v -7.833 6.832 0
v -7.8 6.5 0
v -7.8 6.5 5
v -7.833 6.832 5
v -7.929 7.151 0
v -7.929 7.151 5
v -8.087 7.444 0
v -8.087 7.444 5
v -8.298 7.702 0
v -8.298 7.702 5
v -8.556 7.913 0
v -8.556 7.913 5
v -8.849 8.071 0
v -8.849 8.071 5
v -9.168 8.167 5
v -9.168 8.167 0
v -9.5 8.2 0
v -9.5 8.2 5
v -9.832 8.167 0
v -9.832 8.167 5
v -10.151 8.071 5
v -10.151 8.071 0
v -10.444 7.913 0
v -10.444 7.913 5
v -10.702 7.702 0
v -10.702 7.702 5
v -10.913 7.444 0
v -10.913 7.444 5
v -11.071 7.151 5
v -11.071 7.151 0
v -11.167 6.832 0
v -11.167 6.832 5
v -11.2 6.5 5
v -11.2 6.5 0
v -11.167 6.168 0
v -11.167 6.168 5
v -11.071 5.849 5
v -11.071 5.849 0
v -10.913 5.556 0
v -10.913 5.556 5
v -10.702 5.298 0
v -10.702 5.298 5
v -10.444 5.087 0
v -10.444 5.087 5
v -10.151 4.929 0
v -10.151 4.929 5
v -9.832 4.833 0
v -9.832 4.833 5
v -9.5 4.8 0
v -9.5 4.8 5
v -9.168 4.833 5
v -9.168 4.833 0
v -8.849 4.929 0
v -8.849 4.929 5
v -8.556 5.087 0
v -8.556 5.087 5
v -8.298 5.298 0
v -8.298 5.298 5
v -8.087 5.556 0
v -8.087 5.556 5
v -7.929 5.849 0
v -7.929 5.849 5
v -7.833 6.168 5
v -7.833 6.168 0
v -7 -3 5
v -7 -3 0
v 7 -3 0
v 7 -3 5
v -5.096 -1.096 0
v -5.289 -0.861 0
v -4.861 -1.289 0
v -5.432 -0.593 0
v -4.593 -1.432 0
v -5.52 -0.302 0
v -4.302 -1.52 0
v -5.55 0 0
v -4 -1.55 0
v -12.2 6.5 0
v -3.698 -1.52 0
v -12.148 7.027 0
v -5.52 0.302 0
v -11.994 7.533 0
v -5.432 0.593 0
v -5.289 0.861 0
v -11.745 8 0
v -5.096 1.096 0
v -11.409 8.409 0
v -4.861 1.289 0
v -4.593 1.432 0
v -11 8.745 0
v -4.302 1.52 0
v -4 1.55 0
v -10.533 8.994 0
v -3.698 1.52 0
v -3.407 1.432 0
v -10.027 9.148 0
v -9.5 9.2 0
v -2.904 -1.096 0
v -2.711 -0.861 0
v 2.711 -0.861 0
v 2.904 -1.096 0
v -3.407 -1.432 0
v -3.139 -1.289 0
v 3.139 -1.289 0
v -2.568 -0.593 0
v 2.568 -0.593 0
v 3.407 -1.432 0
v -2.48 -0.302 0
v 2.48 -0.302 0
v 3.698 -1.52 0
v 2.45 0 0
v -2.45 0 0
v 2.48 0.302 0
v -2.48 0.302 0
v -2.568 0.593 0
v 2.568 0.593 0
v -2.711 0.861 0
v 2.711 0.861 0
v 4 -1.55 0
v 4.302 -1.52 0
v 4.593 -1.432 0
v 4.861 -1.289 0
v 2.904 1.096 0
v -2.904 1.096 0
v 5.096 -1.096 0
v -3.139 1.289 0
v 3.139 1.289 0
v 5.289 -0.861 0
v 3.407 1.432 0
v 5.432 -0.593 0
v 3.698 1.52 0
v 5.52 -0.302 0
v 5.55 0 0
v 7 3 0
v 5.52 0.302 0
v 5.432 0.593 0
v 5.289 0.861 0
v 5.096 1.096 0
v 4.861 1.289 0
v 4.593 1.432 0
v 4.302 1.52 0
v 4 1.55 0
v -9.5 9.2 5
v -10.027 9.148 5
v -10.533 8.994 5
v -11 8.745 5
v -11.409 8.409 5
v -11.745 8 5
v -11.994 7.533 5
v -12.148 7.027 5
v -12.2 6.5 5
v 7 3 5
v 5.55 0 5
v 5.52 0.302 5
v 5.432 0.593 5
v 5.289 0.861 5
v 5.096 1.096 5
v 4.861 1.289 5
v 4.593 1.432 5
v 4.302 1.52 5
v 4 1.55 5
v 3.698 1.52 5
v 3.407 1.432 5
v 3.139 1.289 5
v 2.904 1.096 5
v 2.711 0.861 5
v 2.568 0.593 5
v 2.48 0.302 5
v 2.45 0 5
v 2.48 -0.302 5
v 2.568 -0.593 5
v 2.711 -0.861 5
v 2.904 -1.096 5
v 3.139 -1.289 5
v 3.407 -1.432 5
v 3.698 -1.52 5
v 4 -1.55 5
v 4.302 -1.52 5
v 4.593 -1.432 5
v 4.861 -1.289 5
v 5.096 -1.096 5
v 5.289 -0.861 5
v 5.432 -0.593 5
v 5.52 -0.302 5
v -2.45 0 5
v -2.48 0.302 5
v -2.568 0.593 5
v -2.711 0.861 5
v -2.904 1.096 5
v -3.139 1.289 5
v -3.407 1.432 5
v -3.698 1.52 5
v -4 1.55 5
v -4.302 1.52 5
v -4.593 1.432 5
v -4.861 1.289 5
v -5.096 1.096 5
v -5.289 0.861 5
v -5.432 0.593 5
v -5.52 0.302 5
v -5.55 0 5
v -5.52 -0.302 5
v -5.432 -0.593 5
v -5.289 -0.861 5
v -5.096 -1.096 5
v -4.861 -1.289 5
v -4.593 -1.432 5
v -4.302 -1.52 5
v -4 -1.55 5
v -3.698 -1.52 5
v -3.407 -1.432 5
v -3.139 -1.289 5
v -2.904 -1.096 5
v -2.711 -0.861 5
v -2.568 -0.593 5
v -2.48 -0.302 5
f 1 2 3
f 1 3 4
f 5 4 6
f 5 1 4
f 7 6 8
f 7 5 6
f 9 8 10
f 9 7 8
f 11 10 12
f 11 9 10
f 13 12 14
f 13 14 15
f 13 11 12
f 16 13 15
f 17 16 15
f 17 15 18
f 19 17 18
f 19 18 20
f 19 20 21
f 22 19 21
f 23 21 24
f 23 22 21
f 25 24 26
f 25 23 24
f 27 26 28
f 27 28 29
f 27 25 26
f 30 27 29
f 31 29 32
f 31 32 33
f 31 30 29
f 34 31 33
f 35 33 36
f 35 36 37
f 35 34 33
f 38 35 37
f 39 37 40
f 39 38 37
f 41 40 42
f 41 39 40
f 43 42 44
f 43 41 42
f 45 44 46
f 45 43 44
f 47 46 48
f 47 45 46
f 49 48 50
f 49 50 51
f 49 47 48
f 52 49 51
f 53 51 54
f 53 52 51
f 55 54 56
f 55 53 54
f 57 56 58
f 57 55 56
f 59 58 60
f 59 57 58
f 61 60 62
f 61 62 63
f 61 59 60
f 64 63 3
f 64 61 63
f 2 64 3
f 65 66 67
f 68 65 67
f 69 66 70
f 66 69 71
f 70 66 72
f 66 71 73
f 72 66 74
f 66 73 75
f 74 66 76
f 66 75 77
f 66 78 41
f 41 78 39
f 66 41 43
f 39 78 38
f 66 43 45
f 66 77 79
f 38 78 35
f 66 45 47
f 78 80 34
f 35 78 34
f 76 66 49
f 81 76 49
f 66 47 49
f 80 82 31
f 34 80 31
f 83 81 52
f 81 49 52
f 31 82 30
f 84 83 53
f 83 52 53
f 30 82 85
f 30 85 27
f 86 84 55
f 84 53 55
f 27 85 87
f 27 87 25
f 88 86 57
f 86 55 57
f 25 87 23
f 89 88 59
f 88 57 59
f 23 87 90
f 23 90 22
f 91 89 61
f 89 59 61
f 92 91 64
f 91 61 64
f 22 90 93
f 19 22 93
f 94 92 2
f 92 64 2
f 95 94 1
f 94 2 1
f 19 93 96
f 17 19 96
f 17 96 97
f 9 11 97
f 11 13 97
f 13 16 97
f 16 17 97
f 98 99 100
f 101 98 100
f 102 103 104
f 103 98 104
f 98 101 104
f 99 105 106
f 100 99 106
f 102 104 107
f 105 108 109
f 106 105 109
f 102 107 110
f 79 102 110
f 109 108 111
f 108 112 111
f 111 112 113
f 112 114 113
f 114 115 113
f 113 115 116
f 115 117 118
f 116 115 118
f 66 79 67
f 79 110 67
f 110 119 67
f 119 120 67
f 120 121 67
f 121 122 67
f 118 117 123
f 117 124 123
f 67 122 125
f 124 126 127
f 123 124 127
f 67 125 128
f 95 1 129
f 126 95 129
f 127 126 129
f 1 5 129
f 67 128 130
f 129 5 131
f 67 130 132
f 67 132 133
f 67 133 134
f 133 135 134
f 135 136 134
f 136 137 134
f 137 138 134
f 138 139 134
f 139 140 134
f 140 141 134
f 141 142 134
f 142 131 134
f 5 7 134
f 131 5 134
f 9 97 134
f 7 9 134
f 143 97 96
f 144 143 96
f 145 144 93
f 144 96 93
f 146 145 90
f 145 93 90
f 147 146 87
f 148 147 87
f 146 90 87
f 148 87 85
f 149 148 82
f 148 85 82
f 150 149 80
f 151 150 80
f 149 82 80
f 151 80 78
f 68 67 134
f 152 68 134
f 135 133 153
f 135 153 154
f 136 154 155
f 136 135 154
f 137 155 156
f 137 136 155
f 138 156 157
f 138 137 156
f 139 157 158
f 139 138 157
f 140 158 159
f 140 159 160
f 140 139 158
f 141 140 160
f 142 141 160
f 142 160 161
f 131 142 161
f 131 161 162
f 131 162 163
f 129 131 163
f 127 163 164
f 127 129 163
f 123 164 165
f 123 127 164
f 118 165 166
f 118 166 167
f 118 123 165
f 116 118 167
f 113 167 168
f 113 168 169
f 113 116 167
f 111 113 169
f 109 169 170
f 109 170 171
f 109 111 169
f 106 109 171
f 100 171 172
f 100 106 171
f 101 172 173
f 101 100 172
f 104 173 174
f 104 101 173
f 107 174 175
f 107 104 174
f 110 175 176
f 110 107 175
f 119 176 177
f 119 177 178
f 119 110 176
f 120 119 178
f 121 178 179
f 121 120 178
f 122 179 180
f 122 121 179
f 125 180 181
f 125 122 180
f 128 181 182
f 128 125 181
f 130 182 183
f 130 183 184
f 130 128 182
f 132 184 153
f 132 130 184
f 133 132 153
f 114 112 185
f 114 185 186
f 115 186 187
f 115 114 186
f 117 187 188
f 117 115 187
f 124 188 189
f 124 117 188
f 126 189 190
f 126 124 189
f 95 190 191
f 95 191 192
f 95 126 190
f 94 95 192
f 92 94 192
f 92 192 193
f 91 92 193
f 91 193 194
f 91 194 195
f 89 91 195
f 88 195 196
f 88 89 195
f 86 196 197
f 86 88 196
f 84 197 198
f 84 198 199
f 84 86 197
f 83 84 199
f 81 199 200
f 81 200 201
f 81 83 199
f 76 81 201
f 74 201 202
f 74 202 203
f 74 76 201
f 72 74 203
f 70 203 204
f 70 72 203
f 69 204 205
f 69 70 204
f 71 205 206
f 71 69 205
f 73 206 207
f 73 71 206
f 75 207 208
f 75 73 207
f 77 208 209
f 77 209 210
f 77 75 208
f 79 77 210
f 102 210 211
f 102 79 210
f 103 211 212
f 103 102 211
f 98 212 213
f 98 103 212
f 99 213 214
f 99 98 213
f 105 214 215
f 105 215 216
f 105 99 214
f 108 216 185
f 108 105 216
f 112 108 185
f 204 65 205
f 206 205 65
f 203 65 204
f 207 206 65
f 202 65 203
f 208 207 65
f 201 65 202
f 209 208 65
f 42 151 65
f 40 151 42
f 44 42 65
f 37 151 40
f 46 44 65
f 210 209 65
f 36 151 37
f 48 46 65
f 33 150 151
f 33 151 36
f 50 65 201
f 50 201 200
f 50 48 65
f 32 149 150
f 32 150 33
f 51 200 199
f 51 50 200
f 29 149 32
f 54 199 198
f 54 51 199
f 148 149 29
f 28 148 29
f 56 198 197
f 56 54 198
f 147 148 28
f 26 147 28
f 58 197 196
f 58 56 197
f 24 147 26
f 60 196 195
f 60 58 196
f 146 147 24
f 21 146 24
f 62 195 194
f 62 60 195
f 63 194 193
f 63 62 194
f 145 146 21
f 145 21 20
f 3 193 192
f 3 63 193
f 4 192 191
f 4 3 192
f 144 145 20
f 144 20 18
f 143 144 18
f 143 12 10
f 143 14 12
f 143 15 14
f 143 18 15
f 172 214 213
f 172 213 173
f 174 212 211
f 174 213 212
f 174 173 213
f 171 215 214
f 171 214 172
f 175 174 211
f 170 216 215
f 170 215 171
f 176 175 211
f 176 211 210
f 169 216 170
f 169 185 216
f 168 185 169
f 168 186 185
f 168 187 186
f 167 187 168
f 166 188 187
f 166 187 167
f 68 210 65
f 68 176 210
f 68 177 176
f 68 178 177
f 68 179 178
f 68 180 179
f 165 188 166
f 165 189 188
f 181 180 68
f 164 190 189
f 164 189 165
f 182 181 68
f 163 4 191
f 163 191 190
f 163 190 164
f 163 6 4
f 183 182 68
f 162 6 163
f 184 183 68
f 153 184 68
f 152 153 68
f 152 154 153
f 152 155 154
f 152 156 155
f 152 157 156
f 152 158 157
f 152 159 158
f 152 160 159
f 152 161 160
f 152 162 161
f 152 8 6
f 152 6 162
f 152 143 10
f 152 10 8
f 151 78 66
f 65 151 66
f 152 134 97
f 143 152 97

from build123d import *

# Parameters (mm, degrees)
SKETCH1_R           = 1.55
SKETCH1_R_2         = 1.7
BOSS_EXTRUDE1_DEPTH = 5


with BuildPart() as part:
    # Sketch1 → Boss-Extrude1 (new body)
    with BuildSketch(Plane.XY):
        with BuildLine():
            Line((-7, -3), (7, -3))
            Line((7, -3), (7, 3))
            Line((7, 3), (-9.5, 9.2))
            ThreePointArc((-9.5, 9.2), (-11.409188309, 8.409188309), (-12.2, 6.5))
            Line((-12.2, 6.5), (-7, -3))
        make_face()
        with Locations((4, 0)):
            Circle(SKETCH1_R, mode=Mode.SUBTRACT)
        with Locations((-4, 0)):
            Circle(SKETCH1_R, mode=Mode.SUBTRACT)
        with Locations((-9.5, 6.5)):
            Circle(SKETCH1_R_2, mode=Mode.SUBTRACT)
    extrude(amount=BOSS_EXTRUDE1_DEPTH)


solid = part.part
